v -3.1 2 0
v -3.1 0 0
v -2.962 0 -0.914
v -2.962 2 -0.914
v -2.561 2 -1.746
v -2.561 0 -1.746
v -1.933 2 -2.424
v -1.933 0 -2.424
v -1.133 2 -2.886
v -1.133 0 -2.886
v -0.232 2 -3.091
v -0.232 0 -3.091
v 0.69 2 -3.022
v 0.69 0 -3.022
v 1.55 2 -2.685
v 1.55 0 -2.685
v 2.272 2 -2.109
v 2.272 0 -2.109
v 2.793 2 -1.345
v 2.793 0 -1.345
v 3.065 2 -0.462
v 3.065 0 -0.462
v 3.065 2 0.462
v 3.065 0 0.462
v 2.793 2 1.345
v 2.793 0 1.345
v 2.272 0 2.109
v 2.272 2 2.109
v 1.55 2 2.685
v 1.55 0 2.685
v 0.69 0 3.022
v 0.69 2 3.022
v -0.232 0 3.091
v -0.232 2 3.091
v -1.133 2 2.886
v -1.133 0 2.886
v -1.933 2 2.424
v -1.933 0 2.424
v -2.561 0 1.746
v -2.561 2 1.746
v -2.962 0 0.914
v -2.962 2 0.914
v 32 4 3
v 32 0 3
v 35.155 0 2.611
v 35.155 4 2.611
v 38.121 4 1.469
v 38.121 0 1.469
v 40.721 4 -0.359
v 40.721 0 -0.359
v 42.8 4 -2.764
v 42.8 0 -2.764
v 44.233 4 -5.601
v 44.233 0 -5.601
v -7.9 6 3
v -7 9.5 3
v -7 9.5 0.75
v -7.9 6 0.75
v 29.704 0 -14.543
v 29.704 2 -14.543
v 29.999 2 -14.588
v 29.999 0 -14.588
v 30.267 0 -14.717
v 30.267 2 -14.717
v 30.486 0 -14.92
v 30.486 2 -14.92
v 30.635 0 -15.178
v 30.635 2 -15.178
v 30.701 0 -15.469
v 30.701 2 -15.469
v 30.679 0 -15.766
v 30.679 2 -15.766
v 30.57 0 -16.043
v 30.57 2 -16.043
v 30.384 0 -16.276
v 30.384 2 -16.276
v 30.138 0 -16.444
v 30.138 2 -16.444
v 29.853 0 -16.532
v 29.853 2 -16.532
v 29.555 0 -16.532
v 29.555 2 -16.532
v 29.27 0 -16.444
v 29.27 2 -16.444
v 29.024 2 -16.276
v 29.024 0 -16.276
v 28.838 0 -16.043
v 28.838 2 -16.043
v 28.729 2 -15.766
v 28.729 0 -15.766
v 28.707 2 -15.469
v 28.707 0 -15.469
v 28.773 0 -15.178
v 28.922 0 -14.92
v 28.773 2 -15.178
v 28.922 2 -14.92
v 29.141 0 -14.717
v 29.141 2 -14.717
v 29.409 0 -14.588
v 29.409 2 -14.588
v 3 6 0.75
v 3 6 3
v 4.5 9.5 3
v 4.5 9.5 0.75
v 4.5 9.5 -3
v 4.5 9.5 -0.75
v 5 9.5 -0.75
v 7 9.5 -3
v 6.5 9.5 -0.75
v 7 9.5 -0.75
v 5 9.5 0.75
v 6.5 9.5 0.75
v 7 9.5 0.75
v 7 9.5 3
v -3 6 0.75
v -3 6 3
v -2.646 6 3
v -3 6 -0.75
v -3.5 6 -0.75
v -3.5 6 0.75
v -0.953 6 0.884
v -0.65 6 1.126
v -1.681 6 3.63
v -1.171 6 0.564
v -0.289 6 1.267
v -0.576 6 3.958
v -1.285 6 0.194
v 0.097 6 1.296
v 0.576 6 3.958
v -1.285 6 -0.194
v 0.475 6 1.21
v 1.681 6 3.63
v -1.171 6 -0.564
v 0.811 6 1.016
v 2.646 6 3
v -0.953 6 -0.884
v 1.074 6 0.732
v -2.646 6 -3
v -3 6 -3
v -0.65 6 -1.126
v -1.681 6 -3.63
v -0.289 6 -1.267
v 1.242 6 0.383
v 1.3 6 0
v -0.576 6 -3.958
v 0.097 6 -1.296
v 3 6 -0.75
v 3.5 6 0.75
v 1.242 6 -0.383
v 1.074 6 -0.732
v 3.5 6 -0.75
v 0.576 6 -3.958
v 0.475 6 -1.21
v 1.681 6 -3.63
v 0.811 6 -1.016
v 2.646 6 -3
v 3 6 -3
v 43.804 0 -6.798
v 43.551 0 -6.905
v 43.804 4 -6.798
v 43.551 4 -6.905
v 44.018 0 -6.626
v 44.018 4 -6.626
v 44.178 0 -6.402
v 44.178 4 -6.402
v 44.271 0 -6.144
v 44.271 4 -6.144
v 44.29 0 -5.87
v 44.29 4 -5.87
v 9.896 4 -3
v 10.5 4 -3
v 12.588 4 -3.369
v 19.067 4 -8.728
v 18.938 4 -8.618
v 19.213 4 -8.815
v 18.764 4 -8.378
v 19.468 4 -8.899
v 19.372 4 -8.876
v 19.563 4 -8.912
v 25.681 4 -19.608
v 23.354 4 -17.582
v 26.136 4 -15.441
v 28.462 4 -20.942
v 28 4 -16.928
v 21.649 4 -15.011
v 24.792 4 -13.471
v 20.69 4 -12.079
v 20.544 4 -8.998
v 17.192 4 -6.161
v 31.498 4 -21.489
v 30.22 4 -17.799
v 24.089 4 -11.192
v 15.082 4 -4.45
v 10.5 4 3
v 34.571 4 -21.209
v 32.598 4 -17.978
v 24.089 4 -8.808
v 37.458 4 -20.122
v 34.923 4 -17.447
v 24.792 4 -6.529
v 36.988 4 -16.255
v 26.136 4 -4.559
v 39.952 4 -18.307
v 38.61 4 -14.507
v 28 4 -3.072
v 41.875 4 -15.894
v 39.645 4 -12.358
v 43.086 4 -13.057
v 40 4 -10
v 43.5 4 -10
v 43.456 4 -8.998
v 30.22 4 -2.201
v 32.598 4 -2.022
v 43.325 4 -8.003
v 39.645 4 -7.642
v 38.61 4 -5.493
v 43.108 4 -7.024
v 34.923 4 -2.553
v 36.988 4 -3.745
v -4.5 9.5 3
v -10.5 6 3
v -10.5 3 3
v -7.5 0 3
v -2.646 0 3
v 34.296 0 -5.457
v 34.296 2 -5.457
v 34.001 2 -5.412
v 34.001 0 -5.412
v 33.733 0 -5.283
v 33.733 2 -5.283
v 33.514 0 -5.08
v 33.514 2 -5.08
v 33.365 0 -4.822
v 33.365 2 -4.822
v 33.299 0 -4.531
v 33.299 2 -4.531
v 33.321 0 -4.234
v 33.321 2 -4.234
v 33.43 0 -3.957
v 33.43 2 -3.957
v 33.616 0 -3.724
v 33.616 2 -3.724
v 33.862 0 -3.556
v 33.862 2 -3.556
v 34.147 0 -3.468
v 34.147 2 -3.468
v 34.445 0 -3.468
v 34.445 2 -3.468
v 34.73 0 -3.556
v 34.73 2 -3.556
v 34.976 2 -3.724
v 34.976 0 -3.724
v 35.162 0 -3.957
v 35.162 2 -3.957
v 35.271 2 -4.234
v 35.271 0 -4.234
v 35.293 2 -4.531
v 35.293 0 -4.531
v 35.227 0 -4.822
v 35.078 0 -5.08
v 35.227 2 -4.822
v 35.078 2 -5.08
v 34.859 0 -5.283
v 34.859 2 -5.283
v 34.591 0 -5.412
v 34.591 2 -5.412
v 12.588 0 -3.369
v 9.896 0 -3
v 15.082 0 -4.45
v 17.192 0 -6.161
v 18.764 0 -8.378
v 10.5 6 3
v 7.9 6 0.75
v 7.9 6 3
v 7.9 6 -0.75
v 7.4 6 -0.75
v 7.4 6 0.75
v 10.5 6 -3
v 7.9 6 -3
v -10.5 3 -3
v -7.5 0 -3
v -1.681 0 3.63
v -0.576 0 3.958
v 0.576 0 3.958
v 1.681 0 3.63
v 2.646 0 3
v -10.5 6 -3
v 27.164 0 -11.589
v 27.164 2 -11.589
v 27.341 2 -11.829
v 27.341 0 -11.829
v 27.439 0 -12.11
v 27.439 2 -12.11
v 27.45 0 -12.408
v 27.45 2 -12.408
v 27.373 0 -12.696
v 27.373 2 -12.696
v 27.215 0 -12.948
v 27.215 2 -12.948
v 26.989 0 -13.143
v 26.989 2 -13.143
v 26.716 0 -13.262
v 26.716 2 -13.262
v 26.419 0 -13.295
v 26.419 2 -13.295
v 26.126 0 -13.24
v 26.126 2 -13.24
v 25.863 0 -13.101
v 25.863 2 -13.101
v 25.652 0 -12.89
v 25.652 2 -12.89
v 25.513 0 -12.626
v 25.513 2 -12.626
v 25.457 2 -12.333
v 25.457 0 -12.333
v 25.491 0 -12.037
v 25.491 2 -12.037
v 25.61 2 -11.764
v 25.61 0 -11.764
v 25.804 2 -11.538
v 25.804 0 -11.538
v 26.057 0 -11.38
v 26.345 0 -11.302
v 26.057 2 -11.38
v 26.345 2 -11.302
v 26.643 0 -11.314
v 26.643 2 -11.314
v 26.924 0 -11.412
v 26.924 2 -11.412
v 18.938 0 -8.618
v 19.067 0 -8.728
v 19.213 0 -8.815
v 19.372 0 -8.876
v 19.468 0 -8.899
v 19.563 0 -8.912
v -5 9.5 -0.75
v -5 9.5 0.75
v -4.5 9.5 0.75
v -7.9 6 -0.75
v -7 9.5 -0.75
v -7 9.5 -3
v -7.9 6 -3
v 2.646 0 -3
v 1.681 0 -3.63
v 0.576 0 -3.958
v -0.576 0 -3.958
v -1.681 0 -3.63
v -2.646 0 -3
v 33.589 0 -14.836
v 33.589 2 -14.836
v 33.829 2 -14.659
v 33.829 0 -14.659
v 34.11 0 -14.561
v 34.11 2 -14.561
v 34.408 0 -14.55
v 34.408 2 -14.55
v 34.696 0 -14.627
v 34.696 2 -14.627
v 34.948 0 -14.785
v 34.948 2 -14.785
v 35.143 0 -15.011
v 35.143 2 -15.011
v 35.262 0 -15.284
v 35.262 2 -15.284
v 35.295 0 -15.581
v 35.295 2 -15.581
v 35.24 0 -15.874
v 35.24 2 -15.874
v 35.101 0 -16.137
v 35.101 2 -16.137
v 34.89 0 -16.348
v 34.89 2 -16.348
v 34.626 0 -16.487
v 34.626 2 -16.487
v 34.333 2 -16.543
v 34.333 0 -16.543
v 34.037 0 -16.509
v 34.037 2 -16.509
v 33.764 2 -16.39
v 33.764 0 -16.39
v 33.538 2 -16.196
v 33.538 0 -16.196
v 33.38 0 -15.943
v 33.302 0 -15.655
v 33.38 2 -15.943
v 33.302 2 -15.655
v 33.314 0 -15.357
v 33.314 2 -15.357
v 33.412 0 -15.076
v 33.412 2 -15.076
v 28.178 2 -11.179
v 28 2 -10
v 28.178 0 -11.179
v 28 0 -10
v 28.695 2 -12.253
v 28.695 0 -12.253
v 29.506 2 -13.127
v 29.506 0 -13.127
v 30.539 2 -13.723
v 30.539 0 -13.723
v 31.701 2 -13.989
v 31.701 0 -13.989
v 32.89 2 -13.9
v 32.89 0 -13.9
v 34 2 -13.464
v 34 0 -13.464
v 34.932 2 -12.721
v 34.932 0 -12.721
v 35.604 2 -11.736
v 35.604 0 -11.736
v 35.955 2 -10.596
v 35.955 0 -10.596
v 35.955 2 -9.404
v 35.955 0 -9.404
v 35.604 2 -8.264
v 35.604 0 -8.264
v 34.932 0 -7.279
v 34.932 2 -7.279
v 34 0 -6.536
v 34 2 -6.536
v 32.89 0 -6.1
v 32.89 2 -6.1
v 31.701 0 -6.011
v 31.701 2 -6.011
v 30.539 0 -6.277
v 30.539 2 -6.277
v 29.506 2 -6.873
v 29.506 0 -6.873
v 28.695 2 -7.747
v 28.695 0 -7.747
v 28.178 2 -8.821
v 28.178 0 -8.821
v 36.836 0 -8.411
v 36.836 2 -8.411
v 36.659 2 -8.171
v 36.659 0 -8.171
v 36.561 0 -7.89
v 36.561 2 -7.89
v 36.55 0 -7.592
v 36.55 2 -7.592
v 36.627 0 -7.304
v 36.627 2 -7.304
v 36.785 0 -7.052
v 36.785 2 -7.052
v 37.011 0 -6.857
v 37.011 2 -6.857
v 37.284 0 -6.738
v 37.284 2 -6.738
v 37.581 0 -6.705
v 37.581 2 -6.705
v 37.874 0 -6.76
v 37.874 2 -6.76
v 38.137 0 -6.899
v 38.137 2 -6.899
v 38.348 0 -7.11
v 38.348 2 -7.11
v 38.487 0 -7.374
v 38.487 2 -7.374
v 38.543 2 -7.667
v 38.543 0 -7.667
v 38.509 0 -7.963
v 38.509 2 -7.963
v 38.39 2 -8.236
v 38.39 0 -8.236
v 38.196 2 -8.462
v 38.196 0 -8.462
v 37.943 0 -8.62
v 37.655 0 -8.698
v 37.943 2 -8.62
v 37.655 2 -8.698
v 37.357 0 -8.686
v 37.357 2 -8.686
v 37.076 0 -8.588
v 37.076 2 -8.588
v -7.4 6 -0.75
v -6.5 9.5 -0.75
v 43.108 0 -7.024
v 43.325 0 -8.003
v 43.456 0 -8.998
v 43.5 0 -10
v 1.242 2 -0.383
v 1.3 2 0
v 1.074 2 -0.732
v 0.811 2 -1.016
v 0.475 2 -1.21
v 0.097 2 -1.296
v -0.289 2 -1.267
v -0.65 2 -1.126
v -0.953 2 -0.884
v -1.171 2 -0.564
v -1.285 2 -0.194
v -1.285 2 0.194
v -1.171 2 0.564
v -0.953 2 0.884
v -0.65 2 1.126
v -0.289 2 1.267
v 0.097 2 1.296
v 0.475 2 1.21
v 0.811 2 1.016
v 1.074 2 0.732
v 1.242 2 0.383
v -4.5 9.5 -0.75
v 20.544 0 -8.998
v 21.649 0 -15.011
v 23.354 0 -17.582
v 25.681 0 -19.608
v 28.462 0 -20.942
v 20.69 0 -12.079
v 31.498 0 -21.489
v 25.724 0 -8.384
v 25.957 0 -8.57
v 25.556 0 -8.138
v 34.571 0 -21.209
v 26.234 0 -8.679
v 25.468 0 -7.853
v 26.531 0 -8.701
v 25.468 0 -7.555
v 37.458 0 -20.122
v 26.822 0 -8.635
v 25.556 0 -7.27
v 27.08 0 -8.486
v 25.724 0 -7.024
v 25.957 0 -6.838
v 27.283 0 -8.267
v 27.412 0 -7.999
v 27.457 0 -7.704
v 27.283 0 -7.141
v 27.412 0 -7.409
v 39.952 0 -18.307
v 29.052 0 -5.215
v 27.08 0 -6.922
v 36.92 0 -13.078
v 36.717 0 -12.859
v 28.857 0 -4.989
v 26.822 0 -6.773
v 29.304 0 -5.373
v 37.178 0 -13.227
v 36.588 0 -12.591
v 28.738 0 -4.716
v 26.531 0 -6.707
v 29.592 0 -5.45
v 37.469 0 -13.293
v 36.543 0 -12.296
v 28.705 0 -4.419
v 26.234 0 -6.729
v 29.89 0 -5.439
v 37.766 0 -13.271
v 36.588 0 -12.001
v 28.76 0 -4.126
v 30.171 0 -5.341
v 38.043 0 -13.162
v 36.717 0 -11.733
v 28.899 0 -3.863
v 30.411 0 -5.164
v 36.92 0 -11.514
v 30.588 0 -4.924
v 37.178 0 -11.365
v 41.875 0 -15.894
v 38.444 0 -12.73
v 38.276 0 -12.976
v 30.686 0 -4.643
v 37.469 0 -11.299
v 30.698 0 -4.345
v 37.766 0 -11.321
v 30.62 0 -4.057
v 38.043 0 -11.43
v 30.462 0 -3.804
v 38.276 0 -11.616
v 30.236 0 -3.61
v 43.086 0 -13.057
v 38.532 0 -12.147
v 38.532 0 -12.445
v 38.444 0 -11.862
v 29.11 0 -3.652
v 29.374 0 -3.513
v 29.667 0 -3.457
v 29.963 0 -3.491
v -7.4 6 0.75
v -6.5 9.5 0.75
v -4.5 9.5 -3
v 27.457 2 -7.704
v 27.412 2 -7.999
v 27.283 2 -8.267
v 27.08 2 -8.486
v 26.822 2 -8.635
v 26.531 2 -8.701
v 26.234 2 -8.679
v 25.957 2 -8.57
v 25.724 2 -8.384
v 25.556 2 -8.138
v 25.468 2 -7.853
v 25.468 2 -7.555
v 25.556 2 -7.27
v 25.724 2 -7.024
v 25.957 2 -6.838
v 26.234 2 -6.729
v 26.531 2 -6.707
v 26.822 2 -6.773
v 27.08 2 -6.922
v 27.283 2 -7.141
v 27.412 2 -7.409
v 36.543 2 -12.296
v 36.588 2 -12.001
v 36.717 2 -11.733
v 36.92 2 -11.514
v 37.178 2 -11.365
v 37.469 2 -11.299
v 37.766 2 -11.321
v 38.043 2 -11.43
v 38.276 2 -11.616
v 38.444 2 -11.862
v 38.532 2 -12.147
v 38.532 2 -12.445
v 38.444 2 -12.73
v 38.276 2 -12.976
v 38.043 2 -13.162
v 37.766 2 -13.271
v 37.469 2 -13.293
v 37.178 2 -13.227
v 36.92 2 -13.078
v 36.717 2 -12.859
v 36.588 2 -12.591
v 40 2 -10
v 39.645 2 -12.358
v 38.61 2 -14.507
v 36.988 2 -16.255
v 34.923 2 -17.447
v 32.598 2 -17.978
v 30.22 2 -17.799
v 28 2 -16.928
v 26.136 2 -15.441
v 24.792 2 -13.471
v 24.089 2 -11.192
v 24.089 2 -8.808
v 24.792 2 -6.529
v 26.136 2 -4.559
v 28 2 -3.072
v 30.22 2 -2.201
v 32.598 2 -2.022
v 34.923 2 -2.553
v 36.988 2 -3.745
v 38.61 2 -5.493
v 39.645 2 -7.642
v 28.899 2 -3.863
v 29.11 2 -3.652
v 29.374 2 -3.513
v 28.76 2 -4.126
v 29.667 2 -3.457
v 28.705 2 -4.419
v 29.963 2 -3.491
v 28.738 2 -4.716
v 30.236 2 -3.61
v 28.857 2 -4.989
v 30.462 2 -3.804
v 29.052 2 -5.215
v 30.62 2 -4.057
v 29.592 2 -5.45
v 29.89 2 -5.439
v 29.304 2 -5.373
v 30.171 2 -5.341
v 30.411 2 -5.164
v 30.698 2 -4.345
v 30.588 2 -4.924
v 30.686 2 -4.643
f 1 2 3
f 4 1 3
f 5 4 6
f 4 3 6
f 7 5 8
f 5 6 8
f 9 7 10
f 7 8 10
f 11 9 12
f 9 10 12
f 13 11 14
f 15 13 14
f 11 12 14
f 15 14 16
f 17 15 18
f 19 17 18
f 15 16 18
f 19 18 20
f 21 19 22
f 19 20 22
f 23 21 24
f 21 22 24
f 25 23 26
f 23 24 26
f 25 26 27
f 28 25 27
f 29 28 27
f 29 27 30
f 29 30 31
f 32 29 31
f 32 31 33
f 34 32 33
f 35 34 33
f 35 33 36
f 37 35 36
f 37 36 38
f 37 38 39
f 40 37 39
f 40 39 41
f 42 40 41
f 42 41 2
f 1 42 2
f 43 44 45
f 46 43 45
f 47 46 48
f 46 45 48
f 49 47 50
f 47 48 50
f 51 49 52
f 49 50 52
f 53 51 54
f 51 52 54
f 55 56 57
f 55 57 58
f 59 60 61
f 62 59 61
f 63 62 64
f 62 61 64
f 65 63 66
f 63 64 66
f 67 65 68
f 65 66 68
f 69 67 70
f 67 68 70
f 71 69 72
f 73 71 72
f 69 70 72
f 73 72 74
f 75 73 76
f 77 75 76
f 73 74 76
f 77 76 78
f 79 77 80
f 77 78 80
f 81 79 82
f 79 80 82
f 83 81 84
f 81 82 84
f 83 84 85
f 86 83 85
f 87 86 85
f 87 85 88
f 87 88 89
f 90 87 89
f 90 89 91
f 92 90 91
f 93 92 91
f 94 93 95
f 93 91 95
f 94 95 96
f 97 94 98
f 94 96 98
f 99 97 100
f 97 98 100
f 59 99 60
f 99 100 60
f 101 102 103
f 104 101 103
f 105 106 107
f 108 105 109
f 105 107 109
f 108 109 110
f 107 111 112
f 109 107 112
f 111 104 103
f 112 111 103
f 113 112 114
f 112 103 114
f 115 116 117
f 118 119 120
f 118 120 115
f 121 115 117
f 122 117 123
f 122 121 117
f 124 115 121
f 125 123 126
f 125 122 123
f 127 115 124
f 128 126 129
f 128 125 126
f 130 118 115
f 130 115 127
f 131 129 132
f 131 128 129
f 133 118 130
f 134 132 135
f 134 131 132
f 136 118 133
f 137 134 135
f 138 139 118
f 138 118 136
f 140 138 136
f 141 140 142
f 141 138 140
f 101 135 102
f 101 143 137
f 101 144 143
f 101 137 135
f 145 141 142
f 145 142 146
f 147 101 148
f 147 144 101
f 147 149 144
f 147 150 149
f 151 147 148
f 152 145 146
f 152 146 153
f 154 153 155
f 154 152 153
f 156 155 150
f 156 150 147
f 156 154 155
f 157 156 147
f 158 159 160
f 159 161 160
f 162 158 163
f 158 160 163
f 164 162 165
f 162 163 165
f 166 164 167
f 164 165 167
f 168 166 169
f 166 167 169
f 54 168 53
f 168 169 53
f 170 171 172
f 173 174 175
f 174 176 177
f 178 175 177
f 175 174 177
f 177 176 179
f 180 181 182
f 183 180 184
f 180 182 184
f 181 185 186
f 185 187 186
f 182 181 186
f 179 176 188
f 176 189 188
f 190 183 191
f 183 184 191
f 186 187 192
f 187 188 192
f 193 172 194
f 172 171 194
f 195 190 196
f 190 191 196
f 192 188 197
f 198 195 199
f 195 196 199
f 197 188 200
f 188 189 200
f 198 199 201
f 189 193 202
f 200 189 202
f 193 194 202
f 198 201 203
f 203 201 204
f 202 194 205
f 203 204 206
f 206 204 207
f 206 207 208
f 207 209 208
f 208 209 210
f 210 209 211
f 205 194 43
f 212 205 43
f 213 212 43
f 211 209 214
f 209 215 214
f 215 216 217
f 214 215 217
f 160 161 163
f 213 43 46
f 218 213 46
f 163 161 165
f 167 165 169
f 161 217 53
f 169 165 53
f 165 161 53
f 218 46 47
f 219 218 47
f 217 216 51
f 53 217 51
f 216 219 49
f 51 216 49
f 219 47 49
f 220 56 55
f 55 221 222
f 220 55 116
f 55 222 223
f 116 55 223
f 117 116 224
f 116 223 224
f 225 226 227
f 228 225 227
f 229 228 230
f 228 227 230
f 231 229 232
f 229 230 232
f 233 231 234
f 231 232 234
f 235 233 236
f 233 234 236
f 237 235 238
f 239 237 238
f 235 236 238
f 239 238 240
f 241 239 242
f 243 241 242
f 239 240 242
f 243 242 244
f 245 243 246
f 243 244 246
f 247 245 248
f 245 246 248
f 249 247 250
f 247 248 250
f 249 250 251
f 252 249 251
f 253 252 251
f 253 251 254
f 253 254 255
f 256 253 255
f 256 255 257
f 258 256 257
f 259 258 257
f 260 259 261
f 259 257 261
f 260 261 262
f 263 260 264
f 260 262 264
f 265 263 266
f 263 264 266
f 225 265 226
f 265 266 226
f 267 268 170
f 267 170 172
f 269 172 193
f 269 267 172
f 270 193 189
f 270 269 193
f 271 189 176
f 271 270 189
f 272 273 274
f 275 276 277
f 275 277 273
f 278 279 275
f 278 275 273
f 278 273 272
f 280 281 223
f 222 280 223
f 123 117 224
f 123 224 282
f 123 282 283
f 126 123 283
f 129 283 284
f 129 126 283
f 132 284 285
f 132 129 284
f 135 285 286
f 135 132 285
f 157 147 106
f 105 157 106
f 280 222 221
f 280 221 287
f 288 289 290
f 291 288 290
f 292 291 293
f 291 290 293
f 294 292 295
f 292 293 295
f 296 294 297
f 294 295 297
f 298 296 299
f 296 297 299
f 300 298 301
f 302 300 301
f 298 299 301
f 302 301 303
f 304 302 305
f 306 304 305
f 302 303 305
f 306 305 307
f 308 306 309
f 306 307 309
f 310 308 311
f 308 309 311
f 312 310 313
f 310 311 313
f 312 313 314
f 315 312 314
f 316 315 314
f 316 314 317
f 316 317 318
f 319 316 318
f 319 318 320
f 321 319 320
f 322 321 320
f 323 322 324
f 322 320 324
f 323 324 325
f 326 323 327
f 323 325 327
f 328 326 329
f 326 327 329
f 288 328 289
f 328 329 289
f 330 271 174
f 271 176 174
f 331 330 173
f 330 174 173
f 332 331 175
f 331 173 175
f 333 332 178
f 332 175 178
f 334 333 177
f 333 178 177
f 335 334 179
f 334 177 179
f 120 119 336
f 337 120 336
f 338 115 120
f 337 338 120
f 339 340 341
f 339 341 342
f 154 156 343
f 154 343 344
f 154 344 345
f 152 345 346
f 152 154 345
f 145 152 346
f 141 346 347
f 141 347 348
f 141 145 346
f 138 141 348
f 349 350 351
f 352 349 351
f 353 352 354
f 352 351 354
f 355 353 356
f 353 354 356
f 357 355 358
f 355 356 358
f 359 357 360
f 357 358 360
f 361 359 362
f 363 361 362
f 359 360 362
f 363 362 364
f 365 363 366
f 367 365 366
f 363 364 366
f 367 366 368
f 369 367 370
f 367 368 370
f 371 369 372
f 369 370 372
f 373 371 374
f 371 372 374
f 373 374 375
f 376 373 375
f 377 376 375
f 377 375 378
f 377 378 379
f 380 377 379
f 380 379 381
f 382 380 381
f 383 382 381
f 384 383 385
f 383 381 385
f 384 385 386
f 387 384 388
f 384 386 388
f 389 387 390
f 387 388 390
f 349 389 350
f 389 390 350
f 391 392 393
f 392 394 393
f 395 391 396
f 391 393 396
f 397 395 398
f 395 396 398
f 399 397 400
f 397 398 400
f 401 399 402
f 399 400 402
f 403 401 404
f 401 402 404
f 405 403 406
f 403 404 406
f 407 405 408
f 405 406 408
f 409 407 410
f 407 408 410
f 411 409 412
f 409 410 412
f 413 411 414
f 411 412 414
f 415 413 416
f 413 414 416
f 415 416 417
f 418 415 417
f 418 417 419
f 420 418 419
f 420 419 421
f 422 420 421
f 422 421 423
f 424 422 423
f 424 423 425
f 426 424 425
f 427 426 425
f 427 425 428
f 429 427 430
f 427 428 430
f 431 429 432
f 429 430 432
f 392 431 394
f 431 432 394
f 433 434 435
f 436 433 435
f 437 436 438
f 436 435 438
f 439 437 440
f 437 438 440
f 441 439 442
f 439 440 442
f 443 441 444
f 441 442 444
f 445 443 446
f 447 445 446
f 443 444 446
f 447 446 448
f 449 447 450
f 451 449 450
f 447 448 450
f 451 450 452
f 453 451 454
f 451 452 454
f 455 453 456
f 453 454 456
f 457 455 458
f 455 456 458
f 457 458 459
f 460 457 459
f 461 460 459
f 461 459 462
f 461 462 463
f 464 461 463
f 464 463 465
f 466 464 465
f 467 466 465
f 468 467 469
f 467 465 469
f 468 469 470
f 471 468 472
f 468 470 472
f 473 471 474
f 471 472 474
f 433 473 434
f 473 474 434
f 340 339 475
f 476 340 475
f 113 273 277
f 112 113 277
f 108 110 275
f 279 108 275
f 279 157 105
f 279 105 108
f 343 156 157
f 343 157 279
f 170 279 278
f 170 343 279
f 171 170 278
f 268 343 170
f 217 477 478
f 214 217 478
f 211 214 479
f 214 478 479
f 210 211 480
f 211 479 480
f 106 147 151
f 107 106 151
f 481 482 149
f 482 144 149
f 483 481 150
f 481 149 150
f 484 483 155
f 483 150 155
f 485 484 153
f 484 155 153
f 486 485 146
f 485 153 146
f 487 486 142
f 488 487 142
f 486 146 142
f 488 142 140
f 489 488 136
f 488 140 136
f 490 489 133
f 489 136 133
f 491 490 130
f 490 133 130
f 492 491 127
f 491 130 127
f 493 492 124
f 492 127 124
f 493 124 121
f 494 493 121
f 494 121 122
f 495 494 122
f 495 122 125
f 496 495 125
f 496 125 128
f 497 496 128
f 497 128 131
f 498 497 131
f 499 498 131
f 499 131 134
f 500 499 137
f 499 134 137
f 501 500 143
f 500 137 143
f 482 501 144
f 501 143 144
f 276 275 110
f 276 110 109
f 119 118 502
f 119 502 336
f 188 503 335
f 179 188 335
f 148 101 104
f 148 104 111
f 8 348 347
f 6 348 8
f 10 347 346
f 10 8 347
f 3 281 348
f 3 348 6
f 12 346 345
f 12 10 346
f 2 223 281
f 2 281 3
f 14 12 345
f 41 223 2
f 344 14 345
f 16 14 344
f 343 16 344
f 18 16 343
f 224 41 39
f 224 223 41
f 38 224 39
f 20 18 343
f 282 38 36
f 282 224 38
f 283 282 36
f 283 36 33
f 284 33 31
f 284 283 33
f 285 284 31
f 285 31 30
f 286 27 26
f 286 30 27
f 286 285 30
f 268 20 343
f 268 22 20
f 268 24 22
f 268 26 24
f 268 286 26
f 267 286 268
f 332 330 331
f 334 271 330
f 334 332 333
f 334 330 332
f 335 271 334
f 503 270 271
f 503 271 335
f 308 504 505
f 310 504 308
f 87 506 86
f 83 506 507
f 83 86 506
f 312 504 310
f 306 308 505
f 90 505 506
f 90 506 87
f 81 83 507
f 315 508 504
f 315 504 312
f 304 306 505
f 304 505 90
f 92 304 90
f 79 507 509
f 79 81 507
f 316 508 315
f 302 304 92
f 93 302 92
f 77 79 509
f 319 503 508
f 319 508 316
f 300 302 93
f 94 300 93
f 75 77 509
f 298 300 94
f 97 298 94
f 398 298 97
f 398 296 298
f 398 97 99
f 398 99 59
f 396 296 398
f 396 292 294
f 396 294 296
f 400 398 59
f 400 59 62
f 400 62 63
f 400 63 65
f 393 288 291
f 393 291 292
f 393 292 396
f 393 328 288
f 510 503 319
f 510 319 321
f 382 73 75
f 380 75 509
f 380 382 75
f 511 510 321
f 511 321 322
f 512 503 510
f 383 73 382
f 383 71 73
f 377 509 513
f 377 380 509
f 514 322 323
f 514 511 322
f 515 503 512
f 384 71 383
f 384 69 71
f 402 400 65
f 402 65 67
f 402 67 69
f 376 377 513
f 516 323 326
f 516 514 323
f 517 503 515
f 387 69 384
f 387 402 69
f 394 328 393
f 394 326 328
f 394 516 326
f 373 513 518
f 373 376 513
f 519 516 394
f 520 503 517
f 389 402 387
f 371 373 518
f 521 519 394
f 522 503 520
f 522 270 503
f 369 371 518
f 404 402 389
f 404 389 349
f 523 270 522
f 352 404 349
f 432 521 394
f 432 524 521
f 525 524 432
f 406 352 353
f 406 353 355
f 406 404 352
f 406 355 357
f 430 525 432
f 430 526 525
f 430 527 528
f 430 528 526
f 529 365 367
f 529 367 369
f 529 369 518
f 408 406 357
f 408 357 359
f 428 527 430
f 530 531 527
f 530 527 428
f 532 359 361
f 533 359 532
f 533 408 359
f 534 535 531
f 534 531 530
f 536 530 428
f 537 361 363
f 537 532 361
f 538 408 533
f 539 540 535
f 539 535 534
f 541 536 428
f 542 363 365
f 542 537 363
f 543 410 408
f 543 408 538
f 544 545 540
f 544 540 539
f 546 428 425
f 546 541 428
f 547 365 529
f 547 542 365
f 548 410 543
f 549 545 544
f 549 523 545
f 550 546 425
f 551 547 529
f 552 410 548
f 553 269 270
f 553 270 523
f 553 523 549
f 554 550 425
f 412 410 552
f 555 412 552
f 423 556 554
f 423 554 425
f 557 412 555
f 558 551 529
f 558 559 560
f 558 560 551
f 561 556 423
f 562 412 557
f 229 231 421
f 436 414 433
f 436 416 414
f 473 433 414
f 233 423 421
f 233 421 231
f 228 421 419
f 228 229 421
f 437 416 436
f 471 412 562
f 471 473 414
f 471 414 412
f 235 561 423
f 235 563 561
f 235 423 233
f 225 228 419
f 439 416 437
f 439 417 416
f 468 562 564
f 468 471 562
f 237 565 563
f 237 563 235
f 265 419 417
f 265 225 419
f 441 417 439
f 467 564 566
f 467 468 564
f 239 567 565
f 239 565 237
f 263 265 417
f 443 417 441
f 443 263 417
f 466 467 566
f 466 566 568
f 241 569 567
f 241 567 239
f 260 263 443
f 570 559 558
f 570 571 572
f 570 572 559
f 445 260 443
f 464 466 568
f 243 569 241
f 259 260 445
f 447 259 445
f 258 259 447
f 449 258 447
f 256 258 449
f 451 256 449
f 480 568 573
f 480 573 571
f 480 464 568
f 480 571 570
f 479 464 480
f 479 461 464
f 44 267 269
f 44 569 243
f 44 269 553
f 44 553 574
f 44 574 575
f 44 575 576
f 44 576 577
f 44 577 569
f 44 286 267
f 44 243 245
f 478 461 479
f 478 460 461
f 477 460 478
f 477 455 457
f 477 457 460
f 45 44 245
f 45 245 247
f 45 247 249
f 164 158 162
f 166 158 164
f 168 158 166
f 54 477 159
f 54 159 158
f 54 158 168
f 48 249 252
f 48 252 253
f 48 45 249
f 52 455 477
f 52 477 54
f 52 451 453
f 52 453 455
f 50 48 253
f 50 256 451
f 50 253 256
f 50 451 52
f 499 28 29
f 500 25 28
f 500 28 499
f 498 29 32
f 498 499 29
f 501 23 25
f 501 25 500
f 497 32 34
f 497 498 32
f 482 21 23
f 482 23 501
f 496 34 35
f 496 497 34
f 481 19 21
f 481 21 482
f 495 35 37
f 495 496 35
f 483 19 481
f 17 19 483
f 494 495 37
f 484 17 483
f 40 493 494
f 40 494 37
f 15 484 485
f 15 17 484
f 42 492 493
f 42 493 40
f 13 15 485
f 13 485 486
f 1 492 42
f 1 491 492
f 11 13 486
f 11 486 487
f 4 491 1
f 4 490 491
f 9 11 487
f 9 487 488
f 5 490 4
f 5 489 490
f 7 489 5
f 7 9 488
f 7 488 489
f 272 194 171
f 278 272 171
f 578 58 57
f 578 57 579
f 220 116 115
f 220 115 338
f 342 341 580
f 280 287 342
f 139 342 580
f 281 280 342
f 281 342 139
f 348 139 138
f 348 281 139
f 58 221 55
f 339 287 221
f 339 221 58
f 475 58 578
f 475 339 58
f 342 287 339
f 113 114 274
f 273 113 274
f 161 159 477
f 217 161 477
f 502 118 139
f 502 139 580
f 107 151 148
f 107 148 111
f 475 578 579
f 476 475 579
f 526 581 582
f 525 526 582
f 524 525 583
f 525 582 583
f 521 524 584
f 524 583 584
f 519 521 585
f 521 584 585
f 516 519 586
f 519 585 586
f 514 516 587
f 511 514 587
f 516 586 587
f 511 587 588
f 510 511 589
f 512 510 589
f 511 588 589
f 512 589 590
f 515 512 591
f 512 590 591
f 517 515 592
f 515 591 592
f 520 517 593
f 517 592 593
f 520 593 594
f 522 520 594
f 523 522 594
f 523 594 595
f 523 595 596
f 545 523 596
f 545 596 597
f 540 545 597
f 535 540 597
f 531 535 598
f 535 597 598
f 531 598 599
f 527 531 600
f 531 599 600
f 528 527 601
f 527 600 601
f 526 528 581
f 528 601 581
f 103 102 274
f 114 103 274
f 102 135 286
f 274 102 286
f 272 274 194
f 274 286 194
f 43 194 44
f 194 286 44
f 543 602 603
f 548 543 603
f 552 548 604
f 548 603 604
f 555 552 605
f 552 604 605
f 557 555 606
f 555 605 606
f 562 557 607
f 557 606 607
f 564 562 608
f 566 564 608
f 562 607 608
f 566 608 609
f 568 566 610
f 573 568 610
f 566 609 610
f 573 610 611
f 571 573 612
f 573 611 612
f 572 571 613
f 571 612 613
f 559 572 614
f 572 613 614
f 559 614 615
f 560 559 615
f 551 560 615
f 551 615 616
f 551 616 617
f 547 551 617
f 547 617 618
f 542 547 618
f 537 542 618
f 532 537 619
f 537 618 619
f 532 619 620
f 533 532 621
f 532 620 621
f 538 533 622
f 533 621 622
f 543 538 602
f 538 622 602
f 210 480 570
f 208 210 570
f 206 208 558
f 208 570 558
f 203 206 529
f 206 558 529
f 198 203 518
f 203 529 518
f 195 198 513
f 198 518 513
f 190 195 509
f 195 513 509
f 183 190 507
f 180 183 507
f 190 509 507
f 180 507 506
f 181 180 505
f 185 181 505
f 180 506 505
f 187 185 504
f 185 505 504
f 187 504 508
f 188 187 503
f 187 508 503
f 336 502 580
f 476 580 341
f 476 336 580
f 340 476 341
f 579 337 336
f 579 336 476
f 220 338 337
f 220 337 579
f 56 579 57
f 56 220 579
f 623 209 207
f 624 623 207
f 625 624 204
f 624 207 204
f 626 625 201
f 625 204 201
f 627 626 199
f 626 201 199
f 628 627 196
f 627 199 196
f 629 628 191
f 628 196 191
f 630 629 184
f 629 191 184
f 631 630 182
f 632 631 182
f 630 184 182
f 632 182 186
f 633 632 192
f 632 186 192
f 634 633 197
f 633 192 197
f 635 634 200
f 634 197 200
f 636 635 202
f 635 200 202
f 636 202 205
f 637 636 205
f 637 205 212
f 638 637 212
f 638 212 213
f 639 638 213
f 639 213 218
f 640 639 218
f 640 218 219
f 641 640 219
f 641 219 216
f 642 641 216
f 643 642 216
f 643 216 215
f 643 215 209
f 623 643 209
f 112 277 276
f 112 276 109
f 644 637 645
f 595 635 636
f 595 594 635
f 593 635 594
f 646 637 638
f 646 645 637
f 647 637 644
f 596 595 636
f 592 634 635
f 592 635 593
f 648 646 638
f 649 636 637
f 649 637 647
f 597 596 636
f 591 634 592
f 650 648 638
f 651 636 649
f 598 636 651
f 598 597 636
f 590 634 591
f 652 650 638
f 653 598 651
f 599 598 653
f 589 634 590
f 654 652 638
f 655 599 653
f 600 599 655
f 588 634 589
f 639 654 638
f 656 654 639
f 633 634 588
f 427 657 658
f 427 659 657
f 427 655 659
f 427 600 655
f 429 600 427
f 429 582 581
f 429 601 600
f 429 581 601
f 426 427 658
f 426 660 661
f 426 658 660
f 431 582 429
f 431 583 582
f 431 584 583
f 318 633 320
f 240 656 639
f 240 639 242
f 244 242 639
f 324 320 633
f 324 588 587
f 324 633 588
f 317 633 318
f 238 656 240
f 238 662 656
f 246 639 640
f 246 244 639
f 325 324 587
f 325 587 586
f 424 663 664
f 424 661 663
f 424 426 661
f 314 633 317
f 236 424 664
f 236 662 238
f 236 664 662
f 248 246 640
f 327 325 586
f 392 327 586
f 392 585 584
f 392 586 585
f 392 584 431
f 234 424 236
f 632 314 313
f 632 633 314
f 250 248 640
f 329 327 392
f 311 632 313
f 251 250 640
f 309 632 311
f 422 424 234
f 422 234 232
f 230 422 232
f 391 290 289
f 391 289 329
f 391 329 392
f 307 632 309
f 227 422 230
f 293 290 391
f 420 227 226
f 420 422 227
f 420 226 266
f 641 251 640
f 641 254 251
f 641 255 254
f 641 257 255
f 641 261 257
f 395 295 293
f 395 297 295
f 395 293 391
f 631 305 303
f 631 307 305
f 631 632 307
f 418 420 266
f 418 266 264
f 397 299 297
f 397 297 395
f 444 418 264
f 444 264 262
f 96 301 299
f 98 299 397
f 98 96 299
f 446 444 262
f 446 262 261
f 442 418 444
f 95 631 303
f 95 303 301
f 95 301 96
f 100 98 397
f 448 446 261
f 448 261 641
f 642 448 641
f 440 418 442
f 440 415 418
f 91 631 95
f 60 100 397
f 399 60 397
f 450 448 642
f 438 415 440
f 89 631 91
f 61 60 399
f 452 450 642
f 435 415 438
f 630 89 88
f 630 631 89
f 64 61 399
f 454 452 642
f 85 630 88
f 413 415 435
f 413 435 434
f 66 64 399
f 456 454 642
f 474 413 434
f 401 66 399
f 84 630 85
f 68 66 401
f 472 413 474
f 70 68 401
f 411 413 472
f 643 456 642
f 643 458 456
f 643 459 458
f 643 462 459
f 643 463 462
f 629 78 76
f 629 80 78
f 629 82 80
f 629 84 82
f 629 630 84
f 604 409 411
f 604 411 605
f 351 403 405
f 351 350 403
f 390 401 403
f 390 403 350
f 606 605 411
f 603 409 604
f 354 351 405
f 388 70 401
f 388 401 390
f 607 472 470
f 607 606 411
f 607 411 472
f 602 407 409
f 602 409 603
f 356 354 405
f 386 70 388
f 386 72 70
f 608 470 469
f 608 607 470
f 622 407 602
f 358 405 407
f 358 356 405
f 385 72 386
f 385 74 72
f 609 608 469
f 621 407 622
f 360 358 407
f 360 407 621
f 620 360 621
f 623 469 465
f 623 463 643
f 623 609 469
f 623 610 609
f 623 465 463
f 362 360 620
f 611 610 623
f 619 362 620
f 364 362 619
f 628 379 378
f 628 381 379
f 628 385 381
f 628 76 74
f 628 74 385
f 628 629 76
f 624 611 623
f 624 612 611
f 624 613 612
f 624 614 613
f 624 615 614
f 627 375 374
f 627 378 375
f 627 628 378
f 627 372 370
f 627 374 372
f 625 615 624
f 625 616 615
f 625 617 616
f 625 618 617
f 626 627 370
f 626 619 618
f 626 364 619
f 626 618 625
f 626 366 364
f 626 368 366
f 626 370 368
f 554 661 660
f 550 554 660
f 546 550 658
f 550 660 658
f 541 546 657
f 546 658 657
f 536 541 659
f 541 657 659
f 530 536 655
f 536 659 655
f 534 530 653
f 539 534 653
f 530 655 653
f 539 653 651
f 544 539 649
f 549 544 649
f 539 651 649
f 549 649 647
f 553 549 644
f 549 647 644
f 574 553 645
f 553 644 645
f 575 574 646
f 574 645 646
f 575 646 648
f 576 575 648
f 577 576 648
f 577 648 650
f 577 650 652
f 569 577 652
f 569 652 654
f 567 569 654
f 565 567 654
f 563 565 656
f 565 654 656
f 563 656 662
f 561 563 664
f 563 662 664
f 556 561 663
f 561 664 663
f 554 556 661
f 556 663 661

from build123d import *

# Parameters (mm, degrees)
EXTRUDE_1_DEPTH              = 4
FILLET_1_R                   = 10
FILLET_2_R                   = 1
SKETCH_2_W                   = 21
SKETCH_2_H                   = 6
EXTRUDE_2_DEPTH              = 2
SKETCH_3_R                   = 4
EXTRUDE_3_DEPTH              = 6
HOLE_WIZARD_M2_1_D           = 2.6
HOLE_WIZARD_M2_1_CBORE_D     = 6.2
HOLE_WIZARD_M2_1_CBORE_DEPTH = 2
CHAMFER_1_SIZE               = 3
EXTRUDE_4_DEPTH              = 6
CUT_EXTRUDE_2_DEPTH          = 0.75
HOLE_WIZARD_M2_2_D           = 8
HOLE_WIZARD_M2_2_CBORE_D     = 16
HOLE_WIZARD_M2_2_CBORE_DEPTH = 2
SKETCH_9_R                   = 1
CUT_EXTRUDE_1_DEPTH          = 2
PATTERN_CIRCULAR_1_COUNT     = 8


with BuildPart() as part:
    # ｽｹｯﾁ1 → ﾎﾞｽ - 押し出し1 (new body)
    with BuildSketch(Plane(origin=(0, 0, 0), x_dir=(1, 0, 0), z_dir=(0, 1, 0))):
        with BuildLine():
            Line((21.04554885, 3), (19, 3))
            Line((19, 3), (-10.5, 3))
            Line((-10.5, 3), (-10.5, -3))
            Line((-10.5, -3), (32, -3))
            ThreePointArc((32, -3), (25.755002002, -1.401754251), (21.04554885, 3))
        make_face()
        with BuildLine():
            Line((19.049468925, 8.866975344), (19, 8.862647374))
            Line((19, 8.862647374), (19, 3))
            Line((19, 3), (21.04554885, 3))
            ThreePointArc((21.04554885, 3), (19.692790986, 5.812804485), (19.049468925, 8.866975344))
        make_face()
        with BuildLine():
            Line((20.543760972, 8.997708958), (19.049468925, 8.866975344))
            ThreePointArc((19.049468925, 8.866975344), (19.692790986, 5.812804485), (21.04554885, 3))
            Line((21.04554885, 3), (22.875856205, 3))
            ThreePointArc((22.875856205, 3), (21.281736732, 5.832406867), (20.543760972, 8.997708958))
        make_face()
        with BuildLine():
            Line((32, 10), (20.543760972, 8.997708958))
            ThreePointArc((20.543760972, 8.997708958), (21.281736732, 5.832406867), (22.875856205, 3))
            Line((22.875856205, 3), (32, 3))
            Line((32, 3), (32, -1.5))
            ThreePointArc((32, -1.5), (39.000756434, 0.876436587), (43.108147002, 7.023580981))
            Line((43.108147002, 7.023580981), (32, 10))
        make_face()
        with BuildLine():
            ThreePointArc((43.5, 10), (31.498377045, 21.489054548), (20.543760972, 8.997708958))
            Line((20.543760972, 8.997708958), (32, 10))
            Line((32, 10), (43.108147002, 7.023580981))
            ThreePointArc((43.108147002, 7.023580981), (43.401615906, 8.498948789), (43.5, 10))
        make_face()
        with BuildLine():
            Line((32, 3), (22.875856205, 3))
            ThreePointArc((22.875856205, 3), (26.913252513, -0.313825672), (32, -1.5))
            Line((32, -1.5), (32, 3))
        make_face()
        with BuildLine():
            Line((22.875856205, 3), (21.04554885, 3))
            ThreePointArc((21.04554885, 3), (25.755002002, -1.401754251), (32, -3))
            Line((32, -3), (32, -1.5))
            ThreePointArc((32, -1.5), (26.913252513, -0.313825672), (22.875856205, 3))
        make_face()
        with BuildLine():
            ThreePointArc((32, -3), (39.913898577, -0.313593424), (44.557035742, 6.635352414))
            Line((44.557035742, 6.635352414), (43.108147002, 7.023580981))
            ThreePointArc((43.108147002, 7.023580981), (39.000756434, 0.876436587), (32, -1.5))
            Line((32, -1.5), (32, -3))
        make_face()
    extrude(amount=EXTRUDE_1_DEPTH)

    # ﾌｨﾚｯﾄ1
    # the kernel refuses this fillet: 10 mm, written as the material it adds along each edge
    with BuildSketch(Plane(origin=(19, 0, -3), x_dir=(-1, 0, 0), z_dir=(0, 1, 0))) as fillet_1_piece_1:
        with BuildLine():
            CenterArc((9.103972388, -10), FILLET_1_R, 90, 65.560304835)
            Line((0, -5.862647374), (-0.182079448, -5.779900322))
            ThreePointArc((-0.182079448, -5.779900322), (-0.2, -2.931323687), (-0.2, 0))
            Line((-0.2, 0), (0, 0.2))
            Line((0, 0.2), (9.103972388, 0.2))
            Line((9.103972388, 0.2), (9.103972388, 0))
        make_face()
    extrude(amount=4)

    # ﾌｨﾚｯﾄ2
    fillet_2_edges = [part.edges().sort_by_distance(p)[0] for p in [
        (44.557035742, 2, -6.635352414),
        (19, 2, -8.862647374),
    ]]
    fillet(fillet_2_edges, radius=FILLET_2_R)

    # ｽｹｯﾁ2 → ﾎﾞｽ - 押し出し2 (add)
    with BuildSketch(Plane(origin=(0, 4, 0), x_dir=(1, 0, 0), z_dir=(0, 1, 0))):
        Rectangle(SKETCH_2_W, SKETCH_2_H)
    extrude(amount=EXTRUDE_2_DEPTH)

    # ｽｹｯﾁ3 → ﾎﾞｽ - 押し出し3 (add)
    with BuildSketch(Plane(origin=(0, 6, 0), x_dir=(1, 0, 0), z_dir=(0, 1, 0))):
        Circle(SKETCH_3_R)
    extrude(amount=-EXTRUDE_3_DEPTH)

    # M2 丸平ねじ用座ぐり穴1 (through all)
    with Locations(Plane(origin=(0, 0, 0), x_dir=(-1, 0, 0), z_dir=(0, -1, 0))):
        with Locations((0, 0)):
            CounterBoreHole(HOLE_WIZARD_M2_1_D / 2, HOLE_WIZARD_M2_1_CBORE_D / 2, HOLE_WIZARD_M2_1_CBORE_DEPTH)

    # 面取り1
    chamfer_1_edges = [part.edges().sort_by_distance(p)[0] for p in [
        (-10.5, 0, 0),
    ]]
    chamfer(chamfer_1_edges, length=CHAMFER_1_SIZE)

    # ｽｹｯﾁ6 → ﾎﾞｽ - 押し出し4 (add)
    with BuildSketch(Plane.XY.offset(3)):
        Polygon((3, 6), (4.5, 9.5), (7, 9.5), (7.9, 6), align=None)
    extrude_4 = extrude(amount=-EXTRUDE_4_DEPTH)

    # ｽｹｯﾁ10 → ｶｯﾄ - 押し出し2 (cut, symmetric)
    with BuildSketch(Plane.XY):
        Polygon((5, 9.5), (4.5, 9.5), (3, 6), (3.5, 6), align=None)
        Polygon((6.5, 9.5), (7, 9.5), (7.9, 6), (7.4, 6), align=None)
    cut_extrude_2 = extrude(amount=CUT_EXTRUDE_2_DEPTH, both=True, mode=Mode.SUBTRACT)

    # ﾐﾗｰ1: ﾎﾞｽ - 押し出し4, ｶｯﾄ - 押し出し2 across plane
    add(extrude_4.mirror(Plane(origin=(0, 0, 0), x_dir=(0, 0, 1), z_dir=(1, 0, 0))))
    add(cut_extrude_2.mirror(Plane(origin=(0, 0, 0), x_dir=(0, 0, 1), z_dir=(1, 0, 0))), mode=Mode.SUBTRACT)

    # M2 丸平ねじ用座ぐり穴2 (through all)
    with Locations(Plane(origin=(0, 4, 0), x_dir=(1, 0, 0), z_dir=(0, 1, 0))):
        with Locations((32, 10)):
            CounterBoreHole(HOLE_WIZARD_M2_2_D / 2, HOLE_WIZARD_M2_2_CBORE_D / 2, HOLE_WIZARD_M2_2_CBORE_DEPTH)

    # ｽｹｯﾁ9 → ｶｯﾄ - 押し出し1 (cut)
    with BuildSketch(Plane(origin=(0, 2, 0), x_dir=(1, 0, 0), z_dir=(0, 1, 0))):
        with Locations(Location((29.703899406, 15.543277195, 0), (0, 0, 270))):
            Circle(SKETCH_9_R)
    cut_extrude_1 = extrude(amount=-CUT_EXTRUDE_1_DEPTH, mode=Mode.SUBTRACT)

    # 円形ﾊﾟﾀｰﾝ1: ｶｯﾄ - 押し出し1 ×8 about axis
    pattern_circular_1_axis = Axis((32, 0, -10), (0, 1, 0))
    for i in range(1, PATTERN_CIRCULAR_1_COUNT):
        add(cut_extrude_1.rotate(pattern_circular_1_axis, i * 360 / PATTERN_CIRCULAR_1_COUNT), mode=Mode.SUBTRACT)


solid = part.part
